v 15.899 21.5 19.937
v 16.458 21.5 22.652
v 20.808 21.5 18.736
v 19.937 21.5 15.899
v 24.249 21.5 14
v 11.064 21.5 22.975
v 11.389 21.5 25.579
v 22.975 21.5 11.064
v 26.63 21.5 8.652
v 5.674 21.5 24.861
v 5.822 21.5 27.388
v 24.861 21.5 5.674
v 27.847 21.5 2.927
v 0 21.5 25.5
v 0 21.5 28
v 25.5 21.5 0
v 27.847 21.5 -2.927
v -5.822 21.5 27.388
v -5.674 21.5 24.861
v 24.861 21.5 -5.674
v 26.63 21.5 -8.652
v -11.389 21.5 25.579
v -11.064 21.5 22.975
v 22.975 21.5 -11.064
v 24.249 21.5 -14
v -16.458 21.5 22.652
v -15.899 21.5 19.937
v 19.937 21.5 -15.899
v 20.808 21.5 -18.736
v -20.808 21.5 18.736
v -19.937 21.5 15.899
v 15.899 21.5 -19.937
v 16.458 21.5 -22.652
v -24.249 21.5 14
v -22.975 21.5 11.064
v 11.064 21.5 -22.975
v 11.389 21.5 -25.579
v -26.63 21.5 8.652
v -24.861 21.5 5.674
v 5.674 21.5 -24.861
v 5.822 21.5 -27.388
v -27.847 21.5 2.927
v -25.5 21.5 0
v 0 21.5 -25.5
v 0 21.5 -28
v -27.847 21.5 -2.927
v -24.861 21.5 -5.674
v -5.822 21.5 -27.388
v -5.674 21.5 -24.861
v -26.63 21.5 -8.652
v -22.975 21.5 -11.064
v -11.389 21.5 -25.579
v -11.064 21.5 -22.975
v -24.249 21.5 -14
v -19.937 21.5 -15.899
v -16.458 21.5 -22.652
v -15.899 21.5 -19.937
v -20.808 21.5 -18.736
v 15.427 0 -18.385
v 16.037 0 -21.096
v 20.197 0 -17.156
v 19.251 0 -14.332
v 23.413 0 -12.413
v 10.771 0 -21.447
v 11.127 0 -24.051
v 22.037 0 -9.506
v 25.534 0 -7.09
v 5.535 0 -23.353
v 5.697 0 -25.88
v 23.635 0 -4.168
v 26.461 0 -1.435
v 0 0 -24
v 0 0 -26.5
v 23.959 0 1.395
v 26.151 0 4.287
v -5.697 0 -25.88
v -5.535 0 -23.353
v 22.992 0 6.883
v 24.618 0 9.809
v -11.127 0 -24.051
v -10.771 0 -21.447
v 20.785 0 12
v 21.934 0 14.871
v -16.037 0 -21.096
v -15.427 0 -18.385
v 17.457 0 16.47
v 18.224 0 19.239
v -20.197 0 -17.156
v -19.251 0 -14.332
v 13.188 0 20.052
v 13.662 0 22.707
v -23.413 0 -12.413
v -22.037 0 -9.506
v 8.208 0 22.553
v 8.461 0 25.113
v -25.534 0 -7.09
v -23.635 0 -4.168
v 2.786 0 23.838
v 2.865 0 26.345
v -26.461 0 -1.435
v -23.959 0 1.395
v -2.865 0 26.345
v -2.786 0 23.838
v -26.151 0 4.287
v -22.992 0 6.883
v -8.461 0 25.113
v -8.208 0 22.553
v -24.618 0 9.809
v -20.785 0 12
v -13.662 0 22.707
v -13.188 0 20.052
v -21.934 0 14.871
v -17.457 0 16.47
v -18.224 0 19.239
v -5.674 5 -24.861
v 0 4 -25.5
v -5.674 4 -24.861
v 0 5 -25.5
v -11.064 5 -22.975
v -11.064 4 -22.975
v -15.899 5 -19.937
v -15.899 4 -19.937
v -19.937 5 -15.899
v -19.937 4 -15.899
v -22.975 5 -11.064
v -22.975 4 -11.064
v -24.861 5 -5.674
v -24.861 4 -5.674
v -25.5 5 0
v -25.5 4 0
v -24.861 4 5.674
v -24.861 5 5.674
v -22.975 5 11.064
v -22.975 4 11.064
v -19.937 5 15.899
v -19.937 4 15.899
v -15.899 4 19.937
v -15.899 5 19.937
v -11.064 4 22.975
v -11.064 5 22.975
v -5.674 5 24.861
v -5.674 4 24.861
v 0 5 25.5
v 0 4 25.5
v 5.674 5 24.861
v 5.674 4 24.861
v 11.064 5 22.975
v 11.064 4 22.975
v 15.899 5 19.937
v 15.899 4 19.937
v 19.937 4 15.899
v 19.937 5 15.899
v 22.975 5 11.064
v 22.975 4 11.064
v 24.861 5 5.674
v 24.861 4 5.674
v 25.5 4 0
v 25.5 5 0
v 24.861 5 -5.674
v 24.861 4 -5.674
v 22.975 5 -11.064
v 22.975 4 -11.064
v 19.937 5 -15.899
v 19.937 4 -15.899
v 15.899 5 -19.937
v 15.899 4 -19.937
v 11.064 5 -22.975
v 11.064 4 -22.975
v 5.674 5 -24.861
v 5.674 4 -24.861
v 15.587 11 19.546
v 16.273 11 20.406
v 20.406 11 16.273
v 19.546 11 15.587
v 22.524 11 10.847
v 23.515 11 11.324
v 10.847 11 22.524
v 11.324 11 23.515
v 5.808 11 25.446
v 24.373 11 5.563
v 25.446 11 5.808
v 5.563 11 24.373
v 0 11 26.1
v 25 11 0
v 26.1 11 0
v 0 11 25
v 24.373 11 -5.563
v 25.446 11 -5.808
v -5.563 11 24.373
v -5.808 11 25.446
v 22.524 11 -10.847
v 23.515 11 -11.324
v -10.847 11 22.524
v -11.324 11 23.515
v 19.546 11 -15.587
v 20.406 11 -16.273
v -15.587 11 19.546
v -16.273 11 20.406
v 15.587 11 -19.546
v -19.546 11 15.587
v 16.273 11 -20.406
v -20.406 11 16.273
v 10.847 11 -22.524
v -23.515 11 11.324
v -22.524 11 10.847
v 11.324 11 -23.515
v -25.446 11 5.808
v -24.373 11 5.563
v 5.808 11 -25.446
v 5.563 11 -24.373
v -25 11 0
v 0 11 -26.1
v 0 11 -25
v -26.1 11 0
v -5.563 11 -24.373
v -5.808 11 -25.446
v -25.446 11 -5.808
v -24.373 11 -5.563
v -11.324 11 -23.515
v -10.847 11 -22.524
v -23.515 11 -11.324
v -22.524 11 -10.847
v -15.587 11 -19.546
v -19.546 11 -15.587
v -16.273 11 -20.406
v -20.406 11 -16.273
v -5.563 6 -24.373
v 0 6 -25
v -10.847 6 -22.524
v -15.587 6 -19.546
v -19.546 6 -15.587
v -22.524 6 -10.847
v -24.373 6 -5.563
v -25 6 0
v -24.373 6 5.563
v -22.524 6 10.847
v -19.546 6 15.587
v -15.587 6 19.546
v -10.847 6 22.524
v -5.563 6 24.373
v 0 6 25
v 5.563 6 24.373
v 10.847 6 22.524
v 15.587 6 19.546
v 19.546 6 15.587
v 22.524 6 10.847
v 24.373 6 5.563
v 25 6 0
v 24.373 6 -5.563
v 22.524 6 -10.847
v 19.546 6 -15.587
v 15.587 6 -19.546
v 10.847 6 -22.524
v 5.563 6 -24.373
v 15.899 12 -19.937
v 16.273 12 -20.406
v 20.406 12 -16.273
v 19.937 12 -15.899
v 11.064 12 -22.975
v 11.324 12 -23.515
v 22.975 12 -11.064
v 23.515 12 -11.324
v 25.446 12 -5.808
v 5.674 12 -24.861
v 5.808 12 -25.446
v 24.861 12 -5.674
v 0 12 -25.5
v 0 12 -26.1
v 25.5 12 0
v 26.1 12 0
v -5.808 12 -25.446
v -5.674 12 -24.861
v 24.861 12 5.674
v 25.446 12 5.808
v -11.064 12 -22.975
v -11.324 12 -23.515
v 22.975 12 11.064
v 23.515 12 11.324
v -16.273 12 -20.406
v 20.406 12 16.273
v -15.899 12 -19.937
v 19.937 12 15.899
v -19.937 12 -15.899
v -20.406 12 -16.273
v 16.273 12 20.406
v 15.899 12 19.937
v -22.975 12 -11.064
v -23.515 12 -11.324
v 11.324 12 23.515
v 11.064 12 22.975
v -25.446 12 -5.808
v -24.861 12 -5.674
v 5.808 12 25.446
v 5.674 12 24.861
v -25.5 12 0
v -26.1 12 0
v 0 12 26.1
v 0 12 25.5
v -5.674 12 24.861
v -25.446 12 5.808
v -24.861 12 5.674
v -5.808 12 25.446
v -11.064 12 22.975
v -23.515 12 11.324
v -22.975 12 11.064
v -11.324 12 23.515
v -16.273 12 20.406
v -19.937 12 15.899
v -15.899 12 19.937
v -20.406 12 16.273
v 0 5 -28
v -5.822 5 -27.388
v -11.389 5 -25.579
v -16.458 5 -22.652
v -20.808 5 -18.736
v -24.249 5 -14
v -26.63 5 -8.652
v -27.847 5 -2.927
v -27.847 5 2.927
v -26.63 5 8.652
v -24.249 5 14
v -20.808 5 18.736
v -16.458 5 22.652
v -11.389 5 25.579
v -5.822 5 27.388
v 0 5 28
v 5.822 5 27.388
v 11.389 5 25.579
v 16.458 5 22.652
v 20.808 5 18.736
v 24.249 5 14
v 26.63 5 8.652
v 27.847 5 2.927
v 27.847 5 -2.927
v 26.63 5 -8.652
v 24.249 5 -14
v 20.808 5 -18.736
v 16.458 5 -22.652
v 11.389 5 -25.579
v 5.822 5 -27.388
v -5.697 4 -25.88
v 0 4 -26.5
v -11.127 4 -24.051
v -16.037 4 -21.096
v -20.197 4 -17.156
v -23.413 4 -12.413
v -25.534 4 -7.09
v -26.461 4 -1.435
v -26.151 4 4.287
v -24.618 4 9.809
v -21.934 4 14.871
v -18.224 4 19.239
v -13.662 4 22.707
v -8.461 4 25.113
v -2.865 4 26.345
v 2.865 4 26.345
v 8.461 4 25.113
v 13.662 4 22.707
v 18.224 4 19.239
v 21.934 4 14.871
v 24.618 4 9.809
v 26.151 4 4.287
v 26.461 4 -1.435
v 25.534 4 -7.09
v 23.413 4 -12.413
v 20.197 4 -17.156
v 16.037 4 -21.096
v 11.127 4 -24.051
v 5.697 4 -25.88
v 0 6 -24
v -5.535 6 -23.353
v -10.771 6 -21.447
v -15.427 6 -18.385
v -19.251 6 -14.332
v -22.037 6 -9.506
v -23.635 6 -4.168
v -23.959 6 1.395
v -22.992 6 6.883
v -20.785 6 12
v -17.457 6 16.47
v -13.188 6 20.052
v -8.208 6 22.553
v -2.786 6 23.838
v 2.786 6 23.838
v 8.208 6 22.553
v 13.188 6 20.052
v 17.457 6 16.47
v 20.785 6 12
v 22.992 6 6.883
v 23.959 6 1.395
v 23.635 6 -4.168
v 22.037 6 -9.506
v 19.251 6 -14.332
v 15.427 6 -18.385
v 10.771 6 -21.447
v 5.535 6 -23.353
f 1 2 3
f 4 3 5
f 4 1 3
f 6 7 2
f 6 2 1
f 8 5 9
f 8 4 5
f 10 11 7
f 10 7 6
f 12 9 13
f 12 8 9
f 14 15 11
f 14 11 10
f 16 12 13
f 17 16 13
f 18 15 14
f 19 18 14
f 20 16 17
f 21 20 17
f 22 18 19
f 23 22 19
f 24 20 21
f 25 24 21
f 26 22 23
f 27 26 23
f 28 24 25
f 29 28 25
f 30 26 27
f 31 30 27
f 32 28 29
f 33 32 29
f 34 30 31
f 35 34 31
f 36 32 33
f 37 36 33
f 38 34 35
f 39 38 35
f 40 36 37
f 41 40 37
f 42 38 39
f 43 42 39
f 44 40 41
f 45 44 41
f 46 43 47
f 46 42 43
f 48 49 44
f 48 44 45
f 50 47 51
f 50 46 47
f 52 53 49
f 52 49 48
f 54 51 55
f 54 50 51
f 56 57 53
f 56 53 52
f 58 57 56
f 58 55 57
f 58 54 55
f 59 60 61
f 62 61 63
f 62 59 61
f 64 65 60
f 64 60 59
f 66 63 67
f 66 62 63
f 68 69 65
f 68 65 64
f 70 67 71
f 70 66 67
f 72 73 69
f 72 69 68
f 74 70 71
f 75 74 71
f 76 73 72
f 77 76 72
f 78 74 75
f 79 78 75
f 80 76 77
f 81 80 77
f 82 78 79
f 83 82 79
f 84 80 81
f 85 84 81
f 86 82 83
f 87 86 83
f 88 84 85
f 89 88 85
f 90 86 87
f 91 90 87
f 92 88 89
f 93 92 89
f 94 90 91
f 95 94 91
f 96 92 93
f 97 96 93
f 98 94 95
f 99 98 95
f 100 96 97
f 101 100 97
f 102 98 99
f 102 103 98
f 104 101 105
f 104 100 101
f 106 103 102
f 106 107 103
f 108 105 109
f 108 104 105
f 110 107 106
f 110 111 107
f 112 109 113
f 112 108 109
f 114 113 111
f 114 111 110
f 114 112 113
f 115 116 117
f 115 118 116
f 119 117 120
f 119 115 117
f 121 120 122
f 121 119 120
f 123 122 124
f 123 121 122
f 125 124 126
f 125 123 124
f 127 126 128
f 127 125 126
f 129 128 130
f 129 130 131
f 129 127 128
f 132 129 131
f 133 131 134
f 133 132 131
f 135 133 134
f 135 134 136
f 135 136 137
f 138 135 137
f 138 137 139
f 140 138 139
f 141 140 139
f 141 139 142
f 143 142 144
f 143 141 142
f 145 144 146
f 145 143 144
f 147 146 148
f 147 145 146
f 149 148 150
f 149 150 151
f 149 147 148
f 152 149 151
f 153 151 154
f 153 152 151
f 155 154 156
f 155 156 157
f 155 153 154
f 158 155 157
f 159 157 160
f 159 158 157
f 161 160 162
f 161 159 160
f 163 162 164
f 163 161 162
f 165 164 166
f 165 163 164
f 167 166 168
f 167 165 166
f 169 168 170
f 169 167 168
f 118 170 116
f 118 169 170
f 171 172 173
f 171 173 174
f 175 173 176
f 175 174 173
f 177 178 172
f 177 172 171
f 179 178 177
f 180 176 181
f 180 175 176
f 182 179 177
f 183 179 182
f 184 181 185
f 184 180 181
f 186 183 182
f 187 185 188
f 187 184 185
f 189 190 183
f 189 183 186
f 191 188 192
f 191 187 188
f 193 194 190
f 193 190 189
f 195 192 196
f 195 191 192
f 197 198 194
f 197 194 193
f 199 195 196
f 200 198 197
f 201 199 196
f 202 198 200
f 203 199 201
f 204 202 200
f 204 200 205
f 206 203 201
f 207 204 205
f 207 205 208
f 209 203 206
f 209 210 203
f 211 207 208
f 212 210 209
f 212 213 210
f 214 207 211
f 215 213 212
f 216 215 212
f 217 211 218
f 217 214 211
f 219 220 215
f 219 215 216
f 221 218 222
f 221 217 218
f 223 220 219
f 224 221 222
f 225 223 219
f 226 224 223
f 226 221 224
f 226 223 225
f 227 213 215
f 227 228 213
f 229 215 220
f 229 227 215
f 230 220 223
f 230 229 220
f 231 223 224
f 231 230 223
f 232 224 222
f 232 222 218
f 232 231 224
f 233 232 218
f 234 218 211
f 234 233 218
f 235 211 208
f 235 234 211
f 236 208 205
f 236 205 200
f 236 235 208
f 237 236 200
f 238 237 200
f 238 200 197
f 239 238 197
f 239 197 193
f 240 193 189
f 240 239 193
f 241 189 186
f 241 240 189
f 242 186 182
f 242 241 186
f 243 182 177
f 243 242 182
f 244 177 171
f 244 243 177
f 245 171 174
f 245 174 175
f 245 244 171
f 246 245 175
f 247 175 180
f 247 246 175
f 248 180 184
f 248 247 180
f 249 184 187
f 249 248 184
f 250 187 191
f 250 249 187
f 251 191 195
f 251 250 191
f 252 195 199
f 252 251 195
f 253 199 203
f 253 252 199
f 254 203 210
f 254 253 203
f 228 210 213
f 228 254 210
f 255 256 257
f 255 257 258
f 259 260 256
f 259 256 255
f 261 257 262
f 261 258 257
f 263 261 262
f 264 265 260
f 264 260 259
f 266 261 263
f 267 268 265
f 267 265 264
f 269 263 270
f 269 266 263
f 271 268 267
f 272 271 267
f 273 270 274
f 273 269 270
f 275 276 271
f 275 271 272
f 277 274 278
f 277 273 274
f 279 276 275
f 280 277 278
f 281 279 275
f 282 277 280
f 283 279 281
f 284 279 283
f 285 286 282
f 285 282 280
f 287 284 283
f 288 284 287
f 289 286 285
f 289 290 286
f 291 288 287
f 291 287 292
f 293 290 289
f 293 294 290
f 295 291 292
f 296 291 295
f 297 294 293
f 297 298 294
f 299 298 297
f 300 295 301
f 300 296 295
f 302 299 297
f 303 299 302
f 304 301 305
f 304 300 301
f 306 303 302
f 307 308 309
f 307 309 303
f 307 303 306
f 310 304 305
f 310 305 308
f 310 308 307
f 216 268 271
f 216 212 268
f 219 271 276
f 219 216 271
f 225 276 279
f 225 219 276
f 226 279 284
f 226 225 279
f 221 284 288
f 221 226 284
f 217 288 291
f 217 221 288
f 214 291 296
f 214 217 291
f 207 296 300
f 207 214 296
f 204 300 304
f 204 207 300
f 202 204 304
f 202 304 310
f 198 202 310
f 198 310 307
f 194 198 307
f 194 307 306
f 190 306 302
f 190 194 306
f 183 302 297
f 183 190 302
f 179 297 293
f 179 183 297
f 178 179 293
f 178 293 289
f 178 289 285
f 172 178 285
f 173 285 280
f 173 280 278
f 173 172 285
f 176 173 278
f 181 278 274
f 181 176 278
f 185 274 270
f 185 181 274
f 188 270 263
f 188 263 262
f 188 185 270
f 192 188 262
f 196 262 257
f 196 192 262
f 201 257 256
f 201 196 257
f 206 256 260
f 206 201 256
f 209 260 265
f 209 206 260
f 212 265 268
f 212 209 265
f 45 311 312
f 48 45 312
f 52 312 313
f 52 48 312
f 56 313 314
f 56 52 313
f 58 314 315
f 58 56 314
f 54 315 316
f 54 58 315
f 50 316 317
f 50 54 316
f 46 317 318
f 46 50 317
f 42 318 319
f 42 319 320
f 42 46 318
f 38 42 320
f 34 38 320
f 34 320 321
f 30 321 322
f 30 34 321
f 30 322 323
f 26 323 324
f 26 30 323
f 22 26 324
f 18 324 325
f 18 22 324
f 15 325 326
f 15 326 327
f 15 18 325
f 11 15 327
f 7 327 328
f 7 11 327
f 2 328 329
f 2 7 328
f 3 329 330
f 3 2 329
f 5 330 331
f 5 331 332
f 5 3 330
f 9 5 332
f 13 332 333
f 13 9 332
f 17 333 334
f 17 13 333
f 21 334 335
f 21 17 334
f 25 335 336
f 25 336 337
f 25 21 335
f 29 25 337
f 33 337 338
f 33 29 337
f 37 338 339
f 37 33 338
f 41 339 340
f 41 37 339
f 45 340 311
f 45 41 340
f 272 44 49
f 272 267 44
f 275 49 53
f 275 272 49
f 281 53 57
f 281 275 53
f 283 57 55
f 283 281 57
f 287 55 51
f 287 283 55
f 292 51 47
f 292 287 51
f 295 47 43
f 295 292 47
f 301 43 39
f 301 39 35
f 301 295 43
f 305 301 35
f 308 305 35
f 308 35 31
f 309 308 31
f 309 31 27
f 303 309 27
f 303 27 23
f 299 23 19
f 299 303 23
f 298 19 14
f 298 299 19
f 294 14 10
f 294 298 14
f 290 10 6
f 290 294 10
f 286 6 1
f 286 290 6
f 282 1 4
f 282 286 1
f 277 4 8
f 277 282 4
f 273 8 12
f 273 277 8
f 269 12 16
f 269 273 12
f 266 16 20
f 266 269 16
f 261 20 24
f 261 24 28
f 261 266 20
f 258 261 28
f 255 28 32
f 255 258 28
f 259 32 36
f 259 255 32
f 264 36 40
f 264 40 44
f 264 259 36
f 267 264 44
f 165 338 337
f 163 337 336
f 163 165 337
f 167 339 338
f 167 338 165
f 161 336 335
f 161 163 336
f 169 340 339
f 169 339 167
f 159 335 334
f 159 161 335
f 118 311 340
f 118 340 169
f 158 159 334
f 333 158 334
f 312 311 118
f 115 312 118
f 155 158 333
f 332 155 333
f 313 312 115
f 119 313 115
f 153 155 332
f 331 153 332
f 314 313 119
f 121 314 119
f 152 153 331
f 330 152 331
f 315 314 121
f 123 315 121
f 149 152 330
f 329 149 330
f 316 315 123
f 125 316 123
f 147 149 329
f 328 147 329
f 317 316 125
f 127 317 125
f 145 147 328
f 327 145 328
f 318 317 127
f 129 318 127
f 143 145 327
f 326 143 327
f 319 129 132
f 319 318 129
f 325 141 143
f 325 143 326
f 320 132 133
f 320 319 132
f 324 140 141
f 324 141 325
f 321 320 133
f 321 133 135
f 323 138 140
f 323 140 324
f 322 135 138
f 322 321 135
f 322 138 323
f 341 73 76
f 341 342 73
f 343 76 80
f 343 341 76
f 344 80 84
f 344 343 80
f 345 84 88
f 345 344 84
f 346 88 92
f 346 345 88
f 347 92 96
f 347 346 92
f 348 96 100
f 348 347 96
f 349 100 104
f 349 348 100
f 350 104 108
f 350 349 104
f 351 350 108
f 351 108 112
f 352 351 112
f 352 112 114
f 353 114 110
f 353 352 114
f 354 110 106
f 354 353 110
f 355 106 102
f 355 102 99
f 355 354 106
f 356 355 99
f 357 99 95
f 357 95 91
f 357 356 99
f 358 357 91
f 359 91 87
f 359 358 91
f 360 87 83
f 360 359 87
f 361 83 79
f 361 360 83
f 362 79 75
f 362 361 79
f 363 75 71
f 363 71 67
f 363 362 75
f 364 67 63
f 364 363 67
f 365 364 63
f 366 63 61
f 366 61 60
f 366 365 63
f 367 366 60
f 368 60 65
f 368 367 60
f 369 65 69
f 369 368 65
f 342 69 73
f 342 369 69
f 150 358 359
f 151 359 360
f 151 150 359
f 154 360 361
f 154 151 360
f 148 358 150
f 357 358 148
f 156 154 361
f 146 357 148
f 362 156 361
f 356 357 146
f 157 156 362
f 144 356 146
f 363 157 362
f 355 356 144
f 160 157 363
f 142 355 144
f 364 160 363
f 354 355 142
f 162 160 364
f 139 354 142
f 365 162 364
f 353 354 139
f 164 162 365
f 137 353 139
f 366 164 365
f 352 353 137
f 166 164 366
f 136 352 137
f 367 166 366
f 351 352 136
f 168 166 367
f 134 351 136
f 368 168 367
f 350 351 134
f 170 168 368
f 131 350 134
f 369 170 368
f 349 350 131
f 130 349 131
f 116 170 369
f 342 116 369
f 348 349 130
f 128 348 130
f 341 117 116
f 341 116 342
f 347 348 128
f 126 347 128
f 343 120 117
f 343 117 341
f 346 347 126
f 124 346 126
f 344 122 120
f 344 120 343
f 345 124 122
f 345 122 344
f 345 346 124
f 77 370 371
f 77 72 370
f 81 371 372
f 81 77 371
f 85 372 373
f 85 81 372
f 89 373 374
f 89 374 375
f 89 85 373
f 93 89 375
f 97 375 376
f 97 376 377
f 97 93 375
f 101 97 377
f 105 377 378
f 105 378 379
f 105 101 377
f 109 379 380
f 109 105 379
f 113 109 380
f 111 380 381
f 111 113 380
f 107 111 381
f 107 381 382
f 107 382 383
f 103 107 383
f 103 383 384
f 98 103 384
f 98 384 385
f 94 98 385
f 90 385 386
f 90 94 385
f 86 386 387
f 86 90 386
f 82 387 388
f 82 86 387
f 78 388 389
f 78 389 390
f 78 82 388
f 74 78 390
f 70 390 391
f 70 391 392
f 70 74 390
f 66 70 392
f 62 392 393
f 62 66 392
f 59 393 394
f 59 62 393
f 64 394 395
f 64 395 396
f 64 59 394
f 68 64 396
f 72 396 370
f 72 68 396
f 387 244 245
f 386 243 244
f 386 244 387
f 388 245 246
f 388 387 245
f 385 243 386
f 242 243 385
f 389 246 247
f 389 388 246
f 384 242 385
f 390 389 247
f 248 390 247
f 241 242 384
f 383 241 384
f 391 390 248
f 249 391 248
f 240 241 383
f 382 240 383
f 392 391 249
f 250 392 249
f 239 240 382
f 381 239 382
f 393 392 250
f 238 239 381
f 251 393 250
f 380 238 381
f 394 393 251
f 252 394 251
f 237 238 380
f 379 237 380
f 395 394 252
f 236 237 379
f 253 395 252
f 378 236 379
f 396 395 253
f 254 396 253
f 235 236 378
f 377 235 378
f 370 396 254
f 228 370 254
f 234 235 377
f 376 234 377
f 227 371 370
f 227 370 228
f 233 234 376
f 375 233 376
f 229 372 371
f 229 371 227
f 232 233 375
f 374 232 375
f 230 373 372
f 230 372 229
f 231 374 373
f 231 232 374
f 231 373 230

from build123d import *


with BuildPart() as part:
    # 草图1 → 旋转1 (revolve)
    with BuildSketch(Plane.XY, mode=Mode.PRIVATE) as revolve_1_sk:
        Polygon((24, 0), (26.5, 0), (26.5, 4), (25.5, 4), (25.5, 5), (28, 5), (28, 21.5), (25.5, 21.5), (25.5, 12), (26.1, 12), (26.1, 11), (25, 11), (25, 6), (24, 6), align=None)
    revolve(revolve_1_sk.sketch.rotate(Axis((0, 0, 0), (0, 1, 0)), 90), axis=Axis((0, 0, 0), (0, 1, 0)))  # turned: the seam where the file's is


solid = part.part
